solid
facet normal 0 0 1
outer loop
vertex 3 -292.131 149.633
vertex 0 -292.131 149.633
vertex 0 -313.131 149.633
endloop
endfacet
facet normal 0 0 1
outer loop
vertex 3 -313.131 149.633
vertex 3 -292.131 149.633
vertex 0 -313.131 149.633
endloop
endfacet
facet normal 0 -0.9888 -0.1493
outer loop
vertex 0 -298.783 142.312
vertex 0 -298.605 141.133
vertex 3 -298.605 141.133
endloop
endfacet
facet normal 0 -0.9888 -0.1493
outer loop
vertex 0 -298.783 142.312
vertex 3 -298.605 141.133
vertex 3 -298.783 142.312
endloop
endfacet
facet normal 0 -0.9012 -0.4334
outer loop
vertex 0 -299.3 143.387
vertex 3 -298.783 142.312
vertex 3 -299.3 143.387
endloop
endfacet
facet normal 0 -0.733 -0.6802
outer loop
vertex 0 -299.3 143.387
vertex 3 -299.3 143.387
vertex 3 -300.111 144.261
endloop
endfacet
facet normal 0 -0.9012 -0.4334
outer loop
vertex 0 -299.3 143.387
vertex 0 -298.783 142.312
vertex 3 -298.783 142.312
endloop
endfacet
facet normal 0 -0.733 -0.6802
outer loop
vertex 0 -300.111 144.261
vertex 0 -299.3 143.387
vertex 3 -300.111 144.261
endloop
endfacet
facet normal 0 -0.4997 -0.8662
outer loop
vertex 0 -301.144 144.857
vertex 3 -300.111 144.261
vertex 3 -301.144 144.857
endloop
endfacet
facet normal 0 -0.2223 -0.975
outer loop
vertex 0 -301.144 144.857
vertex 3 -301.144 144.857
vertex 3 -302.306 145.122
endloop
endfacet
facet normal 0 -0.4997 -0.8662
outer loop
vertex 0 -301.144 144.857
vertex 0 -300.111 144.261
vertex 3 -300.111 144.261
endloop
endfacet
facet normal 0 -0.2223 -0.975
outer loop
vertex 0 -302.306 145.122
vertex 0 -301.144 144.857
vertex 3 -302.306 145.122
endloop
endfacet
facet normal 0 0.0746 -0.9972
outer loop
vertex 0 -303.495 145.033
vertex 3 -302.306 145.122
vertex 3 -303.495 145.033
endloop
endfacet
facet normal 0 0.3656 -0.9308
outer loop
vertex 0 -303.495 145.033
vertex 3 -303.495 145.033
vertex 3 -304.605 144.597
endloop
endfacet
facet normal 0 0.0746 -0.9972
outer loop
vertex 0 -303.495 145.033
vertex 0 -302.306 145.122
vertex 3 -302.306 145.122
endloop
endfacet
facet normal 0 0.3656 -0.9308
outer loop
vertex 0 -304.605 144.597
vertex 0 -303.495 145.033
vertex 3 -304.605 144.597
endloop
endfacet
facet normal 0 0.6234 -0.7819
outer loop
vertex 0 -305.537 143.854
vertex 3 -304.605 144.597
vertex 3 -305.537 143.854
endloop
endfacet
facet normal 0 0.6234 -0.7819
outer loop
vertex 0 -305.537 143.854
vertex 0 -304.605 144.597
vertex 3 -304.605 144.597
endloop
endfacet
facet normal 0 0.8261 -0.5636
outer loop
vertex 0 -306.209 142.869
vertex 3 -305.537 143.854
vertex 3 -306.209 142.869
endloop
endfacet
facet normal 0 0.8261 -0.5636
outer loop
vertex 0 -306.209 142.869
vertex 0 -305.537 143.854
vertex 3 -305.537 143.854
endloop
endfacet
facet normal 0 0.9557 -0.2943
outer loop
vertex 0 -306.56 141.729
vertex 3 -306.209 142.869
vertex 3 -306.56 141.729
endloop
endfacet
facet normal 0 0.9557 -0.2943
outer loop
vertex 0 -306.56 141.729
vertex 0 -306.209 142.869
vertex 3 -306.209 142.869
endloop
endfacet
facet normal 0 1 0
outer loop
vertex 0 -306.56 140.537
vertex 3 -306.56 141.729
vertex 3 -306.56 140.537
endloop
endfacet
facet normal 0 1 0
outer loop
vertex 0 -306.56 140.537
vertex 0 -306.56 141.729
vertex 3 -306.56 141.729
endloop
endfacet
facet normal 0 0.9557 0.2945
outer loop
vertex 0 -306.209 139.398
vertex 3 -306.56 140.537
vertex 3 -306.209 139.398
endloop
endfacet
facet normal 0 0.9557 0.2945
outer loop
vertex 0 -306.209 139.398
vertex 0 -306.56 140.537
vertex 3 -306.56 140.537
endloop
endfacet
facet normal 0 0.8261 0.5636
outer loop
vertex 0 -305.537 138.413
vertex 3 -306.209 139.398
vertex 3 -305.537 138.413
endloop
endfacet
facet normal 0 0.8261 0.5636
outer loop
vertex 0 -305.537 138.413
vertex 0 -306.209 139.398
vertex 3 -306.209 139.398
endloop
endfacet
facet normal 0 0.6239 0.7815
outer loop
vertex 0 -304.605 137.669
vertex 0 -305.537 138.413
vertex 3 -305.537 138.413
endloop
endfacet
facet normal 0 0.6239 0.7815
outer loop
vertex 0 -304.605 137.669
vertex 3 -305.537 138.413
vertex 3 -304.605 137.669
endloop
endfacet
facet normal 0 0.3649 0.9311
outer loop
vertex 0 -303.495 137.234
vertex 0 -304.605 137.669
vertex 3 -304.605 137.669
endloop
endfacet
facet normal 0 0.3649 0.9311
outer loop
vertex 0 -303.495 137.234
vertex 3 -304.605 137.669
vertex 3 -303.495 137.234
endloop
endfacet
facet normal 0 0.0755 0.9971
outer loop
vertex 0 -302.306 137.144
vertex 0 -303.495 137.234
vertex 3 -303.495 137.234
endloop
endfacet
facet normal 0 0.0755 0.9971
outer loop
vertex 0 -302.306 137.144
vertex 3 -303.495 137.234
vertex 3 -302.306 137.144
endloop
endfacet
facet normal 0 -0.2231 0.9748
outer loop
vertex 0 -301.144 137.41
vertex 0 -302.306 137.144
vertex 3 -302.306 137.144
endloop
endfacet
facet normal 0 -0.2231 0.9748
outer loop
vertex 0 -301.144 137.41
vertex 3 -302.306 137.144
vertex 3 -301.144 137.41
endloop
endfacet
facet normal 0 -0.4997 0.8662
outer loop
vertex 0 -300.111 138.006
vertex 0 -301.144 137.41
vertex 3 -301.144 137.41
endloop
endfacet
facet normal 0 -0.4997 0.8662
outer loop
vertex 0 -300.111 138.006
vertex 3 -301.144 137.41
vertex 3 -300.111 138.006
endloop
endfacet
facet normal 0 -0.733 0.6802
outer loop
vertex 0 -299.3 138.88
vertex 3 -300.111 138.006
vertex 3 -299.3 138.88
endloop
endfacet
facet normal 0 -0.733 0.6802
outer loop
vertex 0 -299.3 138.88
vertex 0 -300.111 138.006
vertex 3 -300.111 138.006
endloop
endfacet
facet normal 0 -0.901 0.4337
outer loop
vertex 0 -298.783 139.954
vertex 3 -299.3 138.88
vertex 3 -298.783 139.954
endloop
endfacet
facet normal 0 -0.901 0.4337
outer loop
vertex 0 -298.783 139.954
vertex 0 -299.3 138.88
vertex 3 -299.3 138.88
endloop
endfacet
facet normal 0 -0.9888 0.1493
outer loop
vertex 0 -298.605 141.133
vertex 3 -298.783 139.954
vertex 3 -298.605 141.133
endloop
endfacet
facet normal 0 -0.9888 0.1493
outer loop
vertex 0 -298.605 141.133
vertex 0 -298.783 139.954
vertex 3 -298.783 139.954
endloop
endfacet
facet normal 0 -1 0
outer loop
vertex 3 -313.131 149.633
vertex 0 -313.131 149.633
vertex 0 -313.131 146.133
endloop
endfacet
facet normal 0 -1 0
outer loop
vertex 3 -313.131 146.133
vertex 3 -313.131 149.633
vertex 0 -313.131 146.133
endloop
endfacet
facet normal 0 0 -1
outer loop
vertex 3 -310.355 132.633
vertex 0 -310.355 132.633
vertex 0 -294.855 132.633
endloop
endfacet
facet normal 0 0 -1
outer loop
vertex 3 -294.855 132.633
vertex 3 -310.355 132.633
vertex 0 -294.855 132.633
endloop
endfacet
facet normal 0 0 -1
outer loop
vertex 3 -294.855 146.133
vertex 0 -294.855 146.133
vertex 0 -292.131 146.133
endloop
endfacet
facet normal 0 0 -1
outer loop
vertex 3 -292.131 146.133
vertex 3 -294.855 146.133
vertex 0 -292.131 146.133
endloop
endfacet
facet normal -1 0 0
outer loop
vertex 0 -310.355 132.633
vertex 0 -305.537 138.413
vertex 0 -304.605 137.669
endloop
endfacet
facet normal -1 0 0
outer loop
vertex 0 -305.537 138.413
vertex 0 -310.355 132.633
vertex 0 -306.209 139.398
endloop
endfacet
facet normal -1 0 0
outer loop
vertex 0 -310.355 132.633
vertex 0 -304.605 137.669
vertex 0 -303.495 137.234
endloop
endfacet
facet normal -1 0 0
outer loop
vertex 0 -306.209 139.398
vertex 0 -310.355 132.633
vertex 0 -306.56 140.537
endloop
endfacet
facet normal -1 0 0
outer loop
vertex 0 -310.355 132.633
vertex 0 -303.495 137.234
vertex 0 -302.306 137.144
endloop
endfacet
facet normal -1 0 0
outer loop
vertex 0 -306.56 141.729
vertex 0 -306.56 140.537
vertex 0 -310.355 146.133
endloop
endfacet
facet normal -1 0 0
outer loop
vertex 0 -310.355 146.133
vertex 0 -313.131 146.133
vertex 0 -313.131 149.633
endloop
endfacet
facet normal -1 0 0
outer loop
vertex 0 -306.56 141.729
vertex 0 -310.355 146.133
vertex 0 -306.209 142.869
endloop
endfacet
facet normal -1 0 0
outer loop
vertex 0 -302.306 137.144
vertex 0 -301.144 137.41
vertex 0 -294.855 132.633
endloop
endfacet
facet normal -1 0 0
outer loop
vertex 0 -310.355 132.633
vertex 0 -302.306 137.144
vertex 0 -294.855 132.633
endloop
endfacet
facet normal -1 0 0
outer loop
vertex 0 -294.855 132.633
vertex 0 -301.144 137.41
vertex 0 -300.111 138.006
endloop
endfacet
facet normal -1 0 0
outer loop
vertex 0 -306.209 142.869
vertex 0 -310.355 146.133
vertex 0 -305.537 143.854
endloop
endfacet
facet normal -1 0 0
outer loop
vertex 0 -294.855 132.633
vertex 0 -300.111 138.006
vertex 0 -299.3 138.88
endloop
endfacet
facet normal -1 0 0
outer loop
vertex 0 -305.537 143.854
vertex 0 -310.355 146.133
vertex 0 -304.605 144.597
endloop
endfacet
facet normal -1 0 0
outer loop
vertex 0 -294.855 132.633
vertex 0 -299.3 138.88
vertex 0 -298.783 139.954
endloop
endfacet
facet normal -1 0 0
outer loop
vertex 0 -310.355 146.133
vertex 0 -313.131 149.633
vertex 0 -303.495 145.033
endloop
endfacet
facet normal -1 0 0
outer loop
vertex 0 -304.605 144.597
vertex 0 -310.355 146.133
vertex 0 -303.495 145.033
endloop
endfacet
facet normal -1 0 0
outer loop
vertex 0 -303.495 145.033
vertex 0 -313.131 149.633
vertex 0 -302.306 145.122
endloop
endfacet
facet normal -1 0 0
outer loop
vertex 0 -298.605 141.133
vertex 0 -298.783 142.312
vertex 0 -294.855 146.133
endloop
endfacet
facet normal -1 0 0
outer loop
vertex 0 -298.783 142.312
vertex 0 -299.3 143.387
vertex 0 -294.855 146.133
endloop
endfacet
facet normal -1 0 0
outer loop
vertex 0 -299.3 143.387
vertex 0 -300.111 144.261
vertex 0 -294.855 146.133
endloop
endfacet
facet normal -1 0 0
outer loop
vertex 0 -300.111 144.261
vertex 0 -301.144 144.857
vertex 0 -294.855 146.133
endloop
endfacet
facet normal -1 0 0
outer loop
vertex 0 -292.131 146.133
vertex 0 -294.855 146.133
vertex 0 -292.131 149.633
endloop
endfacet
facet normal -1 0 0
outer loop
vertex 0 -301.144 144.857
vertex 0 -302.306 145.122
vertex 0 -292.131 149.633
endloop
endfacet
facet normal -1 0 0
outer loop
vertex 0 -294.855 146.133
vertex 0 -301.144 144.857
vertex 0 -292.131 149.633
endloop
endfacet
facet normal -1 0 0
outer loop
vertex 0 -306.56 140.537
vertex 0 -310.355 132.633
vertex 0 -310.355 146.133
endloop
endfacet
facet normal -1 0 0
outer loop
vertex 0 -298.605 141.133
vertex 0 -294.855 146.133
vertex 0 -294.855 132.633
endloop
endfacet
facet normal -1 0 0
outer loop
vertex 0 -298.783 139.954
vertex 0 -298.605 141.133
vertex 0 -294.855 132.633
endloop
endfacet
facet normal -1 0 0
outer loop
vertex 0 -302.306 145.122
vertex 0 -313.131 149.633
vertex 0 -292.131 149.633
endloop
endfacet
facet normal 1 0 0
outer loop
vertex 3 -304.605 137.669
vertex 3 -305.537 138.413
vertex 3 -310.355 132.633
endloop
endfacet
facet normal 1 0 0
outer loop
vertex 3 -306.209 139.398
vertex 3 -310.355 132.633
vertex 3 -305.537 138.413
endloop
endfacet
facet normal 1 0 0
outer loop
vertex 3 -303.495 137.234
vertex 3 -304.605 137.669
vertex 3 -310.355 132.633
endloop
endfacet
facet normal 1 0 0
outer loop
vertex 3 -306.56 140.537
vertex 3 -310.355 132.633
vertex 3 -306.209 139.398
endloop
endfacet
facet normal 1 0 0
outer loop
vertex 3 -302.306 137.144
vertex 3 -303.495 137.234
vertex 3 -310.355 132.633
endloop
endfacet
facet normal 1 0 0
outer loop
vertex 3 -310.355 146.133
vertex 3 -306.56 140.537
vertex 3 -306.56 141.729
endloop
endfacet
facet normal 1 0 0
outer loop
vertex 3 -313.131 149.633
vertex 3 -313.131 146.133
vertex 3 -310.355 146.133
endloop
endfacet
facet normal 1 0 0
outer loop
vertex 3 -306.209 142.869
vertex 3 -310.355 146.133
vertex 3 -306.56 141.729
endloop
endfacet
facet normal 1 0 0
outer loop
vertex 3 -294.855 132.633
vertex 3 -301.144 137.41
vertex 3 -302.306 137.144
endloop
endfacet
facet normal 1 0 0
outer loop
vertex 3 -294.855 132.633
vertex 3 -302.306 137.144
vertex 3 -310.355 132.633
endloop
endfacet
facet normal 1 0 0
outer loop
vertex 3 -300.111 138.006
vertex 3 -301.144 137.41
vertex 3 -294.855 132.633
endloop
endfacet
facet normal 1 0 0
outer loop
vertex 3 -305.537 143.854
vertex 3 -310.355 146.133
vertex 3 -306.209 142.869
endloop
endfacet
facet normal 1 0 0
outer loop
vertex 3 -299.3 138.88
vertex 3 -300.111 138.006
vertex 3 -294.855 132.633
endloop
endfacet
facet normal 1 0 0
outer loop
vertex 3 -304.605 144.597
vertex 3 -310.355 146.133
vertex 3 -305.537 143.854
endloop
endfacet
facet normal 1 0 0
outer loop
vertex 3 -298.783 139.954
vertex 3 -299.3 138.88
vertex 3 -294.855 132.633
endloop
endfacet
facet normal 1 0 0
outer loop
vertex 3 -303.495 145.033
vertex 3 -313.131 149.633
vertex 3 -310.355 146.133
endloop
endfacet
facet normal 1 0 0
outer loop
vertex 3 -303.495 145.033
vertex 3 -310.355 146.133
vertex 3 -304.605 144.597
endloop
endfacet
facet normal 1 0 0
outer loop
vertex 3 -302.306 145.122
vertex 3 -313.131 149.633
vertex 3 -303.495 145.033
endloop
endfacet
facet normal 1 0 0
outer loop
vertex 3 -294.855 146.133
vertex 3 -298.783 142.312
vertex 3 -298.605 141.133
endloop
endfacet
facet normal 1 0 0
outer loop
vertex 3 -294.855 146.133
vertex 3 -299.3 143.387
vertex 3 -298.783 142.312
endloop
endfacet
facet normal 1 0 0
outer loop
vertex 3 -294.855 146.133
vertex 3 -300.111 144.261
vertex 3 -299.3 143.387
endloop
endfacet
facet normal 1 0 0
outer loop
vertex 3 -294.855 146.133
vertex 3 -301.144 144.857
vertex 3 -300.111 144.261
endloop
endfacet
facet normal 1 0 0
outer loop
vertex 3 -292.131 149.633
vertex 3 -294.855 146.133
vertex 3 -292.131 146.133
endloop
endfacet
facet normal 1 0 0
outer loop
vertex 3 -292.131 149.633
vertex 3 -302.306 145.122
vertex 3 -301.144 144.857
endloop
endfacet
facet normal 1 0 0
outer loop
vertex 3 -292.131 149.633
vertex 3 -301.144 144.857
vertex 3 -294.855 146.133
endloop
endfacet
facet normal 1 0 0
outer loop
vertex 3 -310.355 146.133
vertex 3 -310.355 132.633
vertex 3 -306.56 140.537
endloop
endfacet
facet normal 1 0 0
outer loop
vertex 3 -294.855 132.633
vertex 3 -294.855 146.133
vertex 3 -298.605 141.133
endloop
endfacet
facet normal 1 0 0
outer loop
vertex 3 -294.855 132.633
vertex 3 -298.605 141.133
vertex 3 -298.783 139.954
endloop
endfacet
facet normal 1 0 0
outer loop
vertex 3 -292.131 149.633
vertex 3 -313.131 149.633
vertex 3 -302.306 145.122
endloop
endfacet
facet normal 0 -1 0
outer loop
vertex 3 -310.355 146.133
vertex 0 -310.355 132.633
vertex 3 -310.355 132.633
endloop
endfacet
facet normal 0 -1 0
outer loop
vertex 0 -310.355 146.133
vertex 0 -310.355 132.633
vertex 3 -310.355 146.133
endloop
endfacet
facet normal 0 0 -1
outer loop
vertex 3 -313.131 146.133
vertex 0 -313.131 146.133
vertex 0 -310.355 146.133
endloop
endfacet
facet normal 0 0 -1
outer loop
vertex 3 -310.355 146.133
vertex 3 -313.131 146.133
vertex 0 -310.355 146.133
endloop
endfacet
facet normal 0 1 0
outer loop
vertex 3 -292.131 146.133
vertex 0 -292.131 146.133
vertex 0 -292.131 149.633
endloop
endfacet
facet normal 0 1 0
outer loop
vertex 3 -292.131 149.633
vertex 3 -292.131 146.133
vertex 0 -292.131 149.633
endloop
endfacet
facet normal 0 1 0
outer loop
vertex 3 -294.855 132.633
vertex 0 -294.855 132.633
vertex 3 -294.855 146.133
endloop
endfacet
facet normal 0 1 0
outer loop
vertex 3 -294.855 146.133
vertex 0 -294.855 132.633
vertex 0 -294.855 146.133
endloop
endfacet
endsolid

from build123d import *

# Parameters (mm, degrees)
F0_W     = 15.5
F0_H     = 13.5
F0_R     = 4
F1_DEPTH = 3


with BuildPart() as f1:
    # F0 (on Right) → F1 (new body)
    with BuildSketch(Plane.YZ):
        Polygon((-313.131073, 146.133296), (-310.35515, 146.133296), (-294.85515, 146.133296), (-292.131073, 146.133296), (-292.131073, 149.633296), (-313.131073, 149.633296), align=None)
        with Locations((-302.60515, 139.383296)):
            Rectangle(F0_W, F0_H)
        with Locations((-302.60515, 141.133296)):
            Circle(F0_R, mode=Mode.SUBTRACT)
    extrude(amount=F1_DEPTH)


solid = f1.part
